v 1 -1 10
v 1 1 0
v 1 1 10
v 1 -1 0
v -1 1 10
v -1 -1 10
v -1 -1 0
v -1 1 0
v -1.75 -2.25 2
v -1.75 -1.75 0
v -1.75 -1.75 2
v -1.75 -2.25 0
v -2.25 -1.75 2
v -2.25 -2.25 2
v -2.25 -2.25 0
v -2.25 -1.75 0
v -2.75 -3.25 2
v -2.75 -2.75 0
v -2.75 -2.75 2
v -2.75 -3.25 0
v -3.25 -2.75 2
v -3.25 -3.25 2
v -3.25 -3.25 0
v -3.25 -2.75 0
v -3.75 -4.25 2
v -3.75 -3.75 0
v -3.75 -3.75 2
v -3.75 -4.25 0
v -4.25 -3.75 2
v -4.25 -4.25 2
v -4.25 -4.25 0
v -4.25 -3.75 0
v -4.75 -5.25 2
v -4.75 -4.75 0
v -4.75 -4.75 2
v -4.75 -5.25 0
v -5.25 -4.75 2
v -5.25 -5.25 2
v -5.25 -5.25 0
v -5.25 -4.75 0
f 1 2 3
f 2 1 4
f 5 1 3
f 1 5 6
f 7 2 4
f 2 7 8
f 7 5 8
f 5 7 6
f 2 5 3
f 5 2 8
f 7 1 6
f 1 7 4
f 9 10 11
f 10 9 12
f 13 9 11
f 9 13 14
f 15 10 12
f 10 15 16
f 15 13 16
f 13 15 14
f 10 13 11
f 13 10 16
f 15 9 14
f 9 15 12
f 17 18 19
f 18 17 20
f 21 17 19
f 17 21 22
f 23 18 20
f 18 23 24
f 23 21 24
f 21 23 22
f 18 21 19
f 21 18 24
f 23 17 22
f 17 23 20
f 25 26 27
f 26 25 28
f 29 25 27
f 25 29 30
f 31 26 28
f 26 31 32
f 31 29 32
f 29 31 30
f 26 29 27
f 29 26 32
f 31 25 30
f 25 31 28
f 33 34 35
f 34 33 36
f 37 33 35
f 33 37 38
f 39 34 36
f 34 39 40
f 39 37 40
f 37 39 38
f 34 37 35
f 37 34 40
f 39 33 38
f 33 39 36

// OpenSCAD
translate([0, 0, 5]) color([0,1,0,0.9]) cube([2, 2, 10], center=true);
translate([-2.0, -2.0, 1]) color([1,0,0]) cube([0.5, 0.5, 2], center=true);
translate([-3.0, -3.0, 1]) color([1,0,0]) cube([0.5, 0.5, 2], center=true);
translate([-4.0, -4.0, 1]) color([1,0,0]) cube([0.5, 0.5, 2], center=true);
translate([-5.0, -5.0, 1]) color([1,0,0]) cube([0.5, 0.5, 2], center=true);
